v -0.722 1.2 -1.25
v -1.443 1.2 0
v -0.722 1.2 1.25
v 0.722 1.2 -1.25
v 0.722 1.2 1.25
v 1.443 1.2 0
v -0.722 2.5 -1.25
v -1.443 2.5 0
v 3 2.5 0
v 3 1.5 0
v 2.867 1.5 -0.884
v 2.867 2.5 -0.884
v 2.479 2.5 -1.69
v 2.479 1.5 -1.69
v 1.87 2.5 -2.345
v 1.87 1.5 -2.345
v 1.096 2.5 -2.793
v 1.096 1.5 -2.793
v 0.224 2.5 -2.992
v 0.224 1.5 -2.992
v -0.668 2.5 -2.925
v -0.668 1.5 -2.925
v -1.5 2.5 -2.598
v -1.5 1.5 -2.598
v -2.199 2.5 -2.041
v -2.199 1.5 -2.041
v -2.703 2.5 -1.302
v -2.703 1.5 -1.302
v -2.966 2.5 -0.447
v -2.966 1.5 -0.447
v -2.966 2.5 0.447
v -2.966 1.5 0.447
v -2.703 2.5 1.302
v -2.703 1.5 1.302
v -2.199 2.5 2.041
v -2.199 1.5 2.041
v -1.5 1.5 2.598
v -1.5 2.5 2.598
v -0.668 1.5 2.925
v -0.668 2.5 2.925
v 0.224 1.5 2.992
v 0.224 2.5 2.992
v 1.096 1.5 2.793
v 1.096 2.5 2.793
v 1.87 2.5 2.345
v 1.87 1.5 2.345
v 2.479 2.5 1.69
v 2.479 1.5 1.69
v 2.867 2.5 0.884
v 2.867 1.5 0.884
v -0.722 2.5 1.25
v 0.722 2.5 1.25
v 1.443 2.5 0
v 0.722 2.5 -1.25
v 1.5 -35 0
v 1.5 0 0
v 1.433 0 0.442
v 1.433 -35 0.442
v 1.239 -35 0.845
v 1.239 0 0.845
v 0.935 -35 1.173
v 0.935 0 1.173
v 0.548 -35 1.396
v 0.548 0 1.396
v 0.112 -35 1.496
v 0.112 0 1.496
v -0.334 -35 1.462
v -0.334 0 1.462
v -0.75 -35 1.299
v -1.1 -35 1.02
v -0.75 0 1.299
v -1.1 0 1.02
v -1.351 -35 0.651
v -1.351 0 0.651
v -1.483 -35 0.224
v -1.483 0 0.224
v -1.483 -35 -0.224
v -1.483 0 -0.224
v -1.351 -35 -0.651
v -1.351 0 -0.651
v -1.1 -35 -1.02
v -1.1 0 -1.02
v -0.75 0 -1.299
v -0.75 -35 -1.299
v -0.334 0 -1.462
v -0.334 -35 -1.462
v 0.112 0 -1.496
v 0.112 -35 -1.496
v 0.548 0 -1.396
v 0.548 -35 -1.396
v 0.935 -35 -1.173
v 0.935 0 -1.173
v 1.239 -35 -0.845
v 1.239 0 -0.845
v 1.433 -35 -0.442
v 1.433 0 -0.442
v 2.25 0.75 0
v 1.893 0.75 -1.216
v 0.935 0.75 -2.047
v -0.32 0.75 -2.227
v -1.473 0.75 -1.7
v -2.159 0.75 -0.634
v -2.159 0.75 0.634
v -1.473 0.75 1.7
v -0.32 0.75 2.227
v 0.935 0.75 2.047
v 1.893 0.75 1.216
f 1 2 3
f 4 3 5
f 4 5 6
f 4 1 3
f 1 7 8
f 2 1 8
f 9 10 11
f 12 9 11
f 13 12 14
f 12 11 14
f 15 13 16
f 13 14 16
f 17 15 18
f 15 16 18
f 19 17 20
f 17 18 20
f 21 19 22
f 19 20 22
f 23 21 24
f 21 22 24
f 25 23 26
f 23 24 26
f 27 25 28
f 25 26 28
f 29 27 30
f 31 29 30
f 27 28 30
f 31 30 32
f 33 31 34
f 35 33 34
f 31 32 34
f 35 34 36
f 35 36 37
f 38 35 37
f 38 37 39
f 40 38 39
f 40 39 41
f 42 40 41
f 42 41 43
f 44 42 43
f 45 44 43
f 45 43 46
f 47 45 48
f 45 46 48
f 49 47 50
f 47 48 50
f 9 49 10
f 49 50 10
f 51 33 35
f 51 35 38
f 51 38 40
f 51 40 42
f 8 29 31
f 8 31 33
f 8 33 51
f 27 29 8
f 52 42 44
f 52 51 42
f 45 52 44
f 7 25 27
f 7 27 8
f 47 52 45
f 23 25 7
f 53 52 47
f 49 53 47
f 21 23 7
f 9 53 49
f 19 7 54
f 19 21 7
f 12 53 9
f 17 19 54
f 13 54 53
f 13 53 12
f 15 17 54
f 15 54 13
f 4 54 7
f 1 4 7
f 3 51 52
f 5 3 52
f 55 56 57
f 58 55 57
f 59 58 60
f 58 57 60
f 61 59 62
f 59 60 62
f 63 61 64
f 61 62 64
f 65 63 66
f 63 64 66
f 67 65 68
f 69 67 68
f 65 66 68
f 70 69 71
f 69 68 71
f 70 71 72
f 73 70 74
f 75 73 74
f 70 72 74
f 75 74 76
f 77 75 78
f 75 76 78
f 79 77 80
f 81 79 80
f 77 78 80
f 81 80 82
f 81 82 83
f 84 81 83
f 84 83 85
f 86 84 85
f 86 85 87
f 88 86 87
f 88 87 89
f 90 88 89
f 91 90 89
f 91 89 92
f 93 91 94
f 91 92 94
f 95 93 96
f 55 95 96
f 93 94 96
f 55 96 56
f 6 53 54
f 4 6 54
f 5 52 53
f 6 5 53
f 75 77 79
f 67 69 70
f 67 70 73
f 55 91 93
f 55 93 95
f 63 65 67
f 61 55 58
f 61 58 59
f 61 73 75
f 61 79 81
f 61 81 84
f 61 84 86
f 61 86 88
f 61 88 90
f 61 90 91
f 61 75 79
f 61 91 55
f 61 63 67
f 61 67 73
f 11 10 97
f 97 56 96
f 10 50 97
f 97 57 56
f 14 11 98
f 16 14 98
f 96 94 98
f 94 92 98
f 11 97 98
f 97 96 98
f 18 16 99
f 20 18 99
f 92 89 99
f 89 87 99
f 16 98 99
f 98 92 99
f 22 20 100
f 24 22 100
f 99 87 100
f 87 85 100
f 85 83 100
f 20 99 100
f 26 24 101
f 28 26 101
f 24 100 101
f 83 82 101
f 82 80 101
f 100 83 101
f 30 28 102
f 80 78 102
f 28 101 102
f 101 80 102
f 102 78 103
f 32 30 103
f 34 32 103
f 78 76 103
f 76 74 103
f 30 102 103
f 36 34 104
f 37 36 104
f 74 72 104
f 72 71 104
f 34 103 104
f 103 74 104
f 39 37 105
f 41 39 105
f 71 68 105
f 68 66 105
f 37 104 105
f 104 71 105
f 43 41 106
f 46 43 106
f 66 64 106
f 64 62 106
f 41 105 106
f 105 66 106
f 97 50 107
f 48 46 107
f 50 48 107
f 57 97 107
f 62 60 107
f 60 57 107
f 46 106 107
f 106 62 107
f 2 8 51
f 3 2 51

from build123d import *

# Parameters (mm, degrees)
SKETCH_1_R            = 3
EXTRUDE_251_DEPTH     = 2.5
CHAMFER_1_SIZE        = 1.5
CUT_EXTRUDE_459_DEPTH = 1.3
SKETCH_3_R            = 1.5
EXTRUDE_571_DEPTH     = 35


with BuildPart() as part:
    # 草图1 → Extrude 251 (new body)
    with BuildSketch(Plane(origin=(0, 0, 0), x_dir=(1, 0, 0), z_dir=(0, 1, 0))):
        Circle(SKETCH_1_R)
    extrude(amount=EXTRUDE_251_DEPTH)

    # 倒角1
    chamfer_1_edges = [part.edges().sort_by_distance(p)[0] for p in [
        (-3, 0, 0),
    ]]
    chamfer(chamfer_1_edges, length=CHAMFER_1_SIZE)

    # 草图2 → Cut-Extrude 459 (cut)
    with BuildSketch(Plane(origin=(0, 2.5, 0), x_dir=(1, 0, 0), z_dir=(0, 1, 0))):
        Polygon((1.443375673, 0), (0.721687836, 1.25), (-0.721687836, 1.25), (-1.443375673, 0), (-0.721687836, -1.25), (0.721687836, -1.25), align=None)
    extrude(amount=-CUT_EXTRUDE_459_DEPTH, mode=Mode.SUBTRACT)

    # 草图3 → Extrude 571 (add)
    with BuildSketch(Plane.XZ):
        Circle(SKETCH_3_R)
    extrude(amount=EXTRUDE_571_DEPTH)


solid = part.part
